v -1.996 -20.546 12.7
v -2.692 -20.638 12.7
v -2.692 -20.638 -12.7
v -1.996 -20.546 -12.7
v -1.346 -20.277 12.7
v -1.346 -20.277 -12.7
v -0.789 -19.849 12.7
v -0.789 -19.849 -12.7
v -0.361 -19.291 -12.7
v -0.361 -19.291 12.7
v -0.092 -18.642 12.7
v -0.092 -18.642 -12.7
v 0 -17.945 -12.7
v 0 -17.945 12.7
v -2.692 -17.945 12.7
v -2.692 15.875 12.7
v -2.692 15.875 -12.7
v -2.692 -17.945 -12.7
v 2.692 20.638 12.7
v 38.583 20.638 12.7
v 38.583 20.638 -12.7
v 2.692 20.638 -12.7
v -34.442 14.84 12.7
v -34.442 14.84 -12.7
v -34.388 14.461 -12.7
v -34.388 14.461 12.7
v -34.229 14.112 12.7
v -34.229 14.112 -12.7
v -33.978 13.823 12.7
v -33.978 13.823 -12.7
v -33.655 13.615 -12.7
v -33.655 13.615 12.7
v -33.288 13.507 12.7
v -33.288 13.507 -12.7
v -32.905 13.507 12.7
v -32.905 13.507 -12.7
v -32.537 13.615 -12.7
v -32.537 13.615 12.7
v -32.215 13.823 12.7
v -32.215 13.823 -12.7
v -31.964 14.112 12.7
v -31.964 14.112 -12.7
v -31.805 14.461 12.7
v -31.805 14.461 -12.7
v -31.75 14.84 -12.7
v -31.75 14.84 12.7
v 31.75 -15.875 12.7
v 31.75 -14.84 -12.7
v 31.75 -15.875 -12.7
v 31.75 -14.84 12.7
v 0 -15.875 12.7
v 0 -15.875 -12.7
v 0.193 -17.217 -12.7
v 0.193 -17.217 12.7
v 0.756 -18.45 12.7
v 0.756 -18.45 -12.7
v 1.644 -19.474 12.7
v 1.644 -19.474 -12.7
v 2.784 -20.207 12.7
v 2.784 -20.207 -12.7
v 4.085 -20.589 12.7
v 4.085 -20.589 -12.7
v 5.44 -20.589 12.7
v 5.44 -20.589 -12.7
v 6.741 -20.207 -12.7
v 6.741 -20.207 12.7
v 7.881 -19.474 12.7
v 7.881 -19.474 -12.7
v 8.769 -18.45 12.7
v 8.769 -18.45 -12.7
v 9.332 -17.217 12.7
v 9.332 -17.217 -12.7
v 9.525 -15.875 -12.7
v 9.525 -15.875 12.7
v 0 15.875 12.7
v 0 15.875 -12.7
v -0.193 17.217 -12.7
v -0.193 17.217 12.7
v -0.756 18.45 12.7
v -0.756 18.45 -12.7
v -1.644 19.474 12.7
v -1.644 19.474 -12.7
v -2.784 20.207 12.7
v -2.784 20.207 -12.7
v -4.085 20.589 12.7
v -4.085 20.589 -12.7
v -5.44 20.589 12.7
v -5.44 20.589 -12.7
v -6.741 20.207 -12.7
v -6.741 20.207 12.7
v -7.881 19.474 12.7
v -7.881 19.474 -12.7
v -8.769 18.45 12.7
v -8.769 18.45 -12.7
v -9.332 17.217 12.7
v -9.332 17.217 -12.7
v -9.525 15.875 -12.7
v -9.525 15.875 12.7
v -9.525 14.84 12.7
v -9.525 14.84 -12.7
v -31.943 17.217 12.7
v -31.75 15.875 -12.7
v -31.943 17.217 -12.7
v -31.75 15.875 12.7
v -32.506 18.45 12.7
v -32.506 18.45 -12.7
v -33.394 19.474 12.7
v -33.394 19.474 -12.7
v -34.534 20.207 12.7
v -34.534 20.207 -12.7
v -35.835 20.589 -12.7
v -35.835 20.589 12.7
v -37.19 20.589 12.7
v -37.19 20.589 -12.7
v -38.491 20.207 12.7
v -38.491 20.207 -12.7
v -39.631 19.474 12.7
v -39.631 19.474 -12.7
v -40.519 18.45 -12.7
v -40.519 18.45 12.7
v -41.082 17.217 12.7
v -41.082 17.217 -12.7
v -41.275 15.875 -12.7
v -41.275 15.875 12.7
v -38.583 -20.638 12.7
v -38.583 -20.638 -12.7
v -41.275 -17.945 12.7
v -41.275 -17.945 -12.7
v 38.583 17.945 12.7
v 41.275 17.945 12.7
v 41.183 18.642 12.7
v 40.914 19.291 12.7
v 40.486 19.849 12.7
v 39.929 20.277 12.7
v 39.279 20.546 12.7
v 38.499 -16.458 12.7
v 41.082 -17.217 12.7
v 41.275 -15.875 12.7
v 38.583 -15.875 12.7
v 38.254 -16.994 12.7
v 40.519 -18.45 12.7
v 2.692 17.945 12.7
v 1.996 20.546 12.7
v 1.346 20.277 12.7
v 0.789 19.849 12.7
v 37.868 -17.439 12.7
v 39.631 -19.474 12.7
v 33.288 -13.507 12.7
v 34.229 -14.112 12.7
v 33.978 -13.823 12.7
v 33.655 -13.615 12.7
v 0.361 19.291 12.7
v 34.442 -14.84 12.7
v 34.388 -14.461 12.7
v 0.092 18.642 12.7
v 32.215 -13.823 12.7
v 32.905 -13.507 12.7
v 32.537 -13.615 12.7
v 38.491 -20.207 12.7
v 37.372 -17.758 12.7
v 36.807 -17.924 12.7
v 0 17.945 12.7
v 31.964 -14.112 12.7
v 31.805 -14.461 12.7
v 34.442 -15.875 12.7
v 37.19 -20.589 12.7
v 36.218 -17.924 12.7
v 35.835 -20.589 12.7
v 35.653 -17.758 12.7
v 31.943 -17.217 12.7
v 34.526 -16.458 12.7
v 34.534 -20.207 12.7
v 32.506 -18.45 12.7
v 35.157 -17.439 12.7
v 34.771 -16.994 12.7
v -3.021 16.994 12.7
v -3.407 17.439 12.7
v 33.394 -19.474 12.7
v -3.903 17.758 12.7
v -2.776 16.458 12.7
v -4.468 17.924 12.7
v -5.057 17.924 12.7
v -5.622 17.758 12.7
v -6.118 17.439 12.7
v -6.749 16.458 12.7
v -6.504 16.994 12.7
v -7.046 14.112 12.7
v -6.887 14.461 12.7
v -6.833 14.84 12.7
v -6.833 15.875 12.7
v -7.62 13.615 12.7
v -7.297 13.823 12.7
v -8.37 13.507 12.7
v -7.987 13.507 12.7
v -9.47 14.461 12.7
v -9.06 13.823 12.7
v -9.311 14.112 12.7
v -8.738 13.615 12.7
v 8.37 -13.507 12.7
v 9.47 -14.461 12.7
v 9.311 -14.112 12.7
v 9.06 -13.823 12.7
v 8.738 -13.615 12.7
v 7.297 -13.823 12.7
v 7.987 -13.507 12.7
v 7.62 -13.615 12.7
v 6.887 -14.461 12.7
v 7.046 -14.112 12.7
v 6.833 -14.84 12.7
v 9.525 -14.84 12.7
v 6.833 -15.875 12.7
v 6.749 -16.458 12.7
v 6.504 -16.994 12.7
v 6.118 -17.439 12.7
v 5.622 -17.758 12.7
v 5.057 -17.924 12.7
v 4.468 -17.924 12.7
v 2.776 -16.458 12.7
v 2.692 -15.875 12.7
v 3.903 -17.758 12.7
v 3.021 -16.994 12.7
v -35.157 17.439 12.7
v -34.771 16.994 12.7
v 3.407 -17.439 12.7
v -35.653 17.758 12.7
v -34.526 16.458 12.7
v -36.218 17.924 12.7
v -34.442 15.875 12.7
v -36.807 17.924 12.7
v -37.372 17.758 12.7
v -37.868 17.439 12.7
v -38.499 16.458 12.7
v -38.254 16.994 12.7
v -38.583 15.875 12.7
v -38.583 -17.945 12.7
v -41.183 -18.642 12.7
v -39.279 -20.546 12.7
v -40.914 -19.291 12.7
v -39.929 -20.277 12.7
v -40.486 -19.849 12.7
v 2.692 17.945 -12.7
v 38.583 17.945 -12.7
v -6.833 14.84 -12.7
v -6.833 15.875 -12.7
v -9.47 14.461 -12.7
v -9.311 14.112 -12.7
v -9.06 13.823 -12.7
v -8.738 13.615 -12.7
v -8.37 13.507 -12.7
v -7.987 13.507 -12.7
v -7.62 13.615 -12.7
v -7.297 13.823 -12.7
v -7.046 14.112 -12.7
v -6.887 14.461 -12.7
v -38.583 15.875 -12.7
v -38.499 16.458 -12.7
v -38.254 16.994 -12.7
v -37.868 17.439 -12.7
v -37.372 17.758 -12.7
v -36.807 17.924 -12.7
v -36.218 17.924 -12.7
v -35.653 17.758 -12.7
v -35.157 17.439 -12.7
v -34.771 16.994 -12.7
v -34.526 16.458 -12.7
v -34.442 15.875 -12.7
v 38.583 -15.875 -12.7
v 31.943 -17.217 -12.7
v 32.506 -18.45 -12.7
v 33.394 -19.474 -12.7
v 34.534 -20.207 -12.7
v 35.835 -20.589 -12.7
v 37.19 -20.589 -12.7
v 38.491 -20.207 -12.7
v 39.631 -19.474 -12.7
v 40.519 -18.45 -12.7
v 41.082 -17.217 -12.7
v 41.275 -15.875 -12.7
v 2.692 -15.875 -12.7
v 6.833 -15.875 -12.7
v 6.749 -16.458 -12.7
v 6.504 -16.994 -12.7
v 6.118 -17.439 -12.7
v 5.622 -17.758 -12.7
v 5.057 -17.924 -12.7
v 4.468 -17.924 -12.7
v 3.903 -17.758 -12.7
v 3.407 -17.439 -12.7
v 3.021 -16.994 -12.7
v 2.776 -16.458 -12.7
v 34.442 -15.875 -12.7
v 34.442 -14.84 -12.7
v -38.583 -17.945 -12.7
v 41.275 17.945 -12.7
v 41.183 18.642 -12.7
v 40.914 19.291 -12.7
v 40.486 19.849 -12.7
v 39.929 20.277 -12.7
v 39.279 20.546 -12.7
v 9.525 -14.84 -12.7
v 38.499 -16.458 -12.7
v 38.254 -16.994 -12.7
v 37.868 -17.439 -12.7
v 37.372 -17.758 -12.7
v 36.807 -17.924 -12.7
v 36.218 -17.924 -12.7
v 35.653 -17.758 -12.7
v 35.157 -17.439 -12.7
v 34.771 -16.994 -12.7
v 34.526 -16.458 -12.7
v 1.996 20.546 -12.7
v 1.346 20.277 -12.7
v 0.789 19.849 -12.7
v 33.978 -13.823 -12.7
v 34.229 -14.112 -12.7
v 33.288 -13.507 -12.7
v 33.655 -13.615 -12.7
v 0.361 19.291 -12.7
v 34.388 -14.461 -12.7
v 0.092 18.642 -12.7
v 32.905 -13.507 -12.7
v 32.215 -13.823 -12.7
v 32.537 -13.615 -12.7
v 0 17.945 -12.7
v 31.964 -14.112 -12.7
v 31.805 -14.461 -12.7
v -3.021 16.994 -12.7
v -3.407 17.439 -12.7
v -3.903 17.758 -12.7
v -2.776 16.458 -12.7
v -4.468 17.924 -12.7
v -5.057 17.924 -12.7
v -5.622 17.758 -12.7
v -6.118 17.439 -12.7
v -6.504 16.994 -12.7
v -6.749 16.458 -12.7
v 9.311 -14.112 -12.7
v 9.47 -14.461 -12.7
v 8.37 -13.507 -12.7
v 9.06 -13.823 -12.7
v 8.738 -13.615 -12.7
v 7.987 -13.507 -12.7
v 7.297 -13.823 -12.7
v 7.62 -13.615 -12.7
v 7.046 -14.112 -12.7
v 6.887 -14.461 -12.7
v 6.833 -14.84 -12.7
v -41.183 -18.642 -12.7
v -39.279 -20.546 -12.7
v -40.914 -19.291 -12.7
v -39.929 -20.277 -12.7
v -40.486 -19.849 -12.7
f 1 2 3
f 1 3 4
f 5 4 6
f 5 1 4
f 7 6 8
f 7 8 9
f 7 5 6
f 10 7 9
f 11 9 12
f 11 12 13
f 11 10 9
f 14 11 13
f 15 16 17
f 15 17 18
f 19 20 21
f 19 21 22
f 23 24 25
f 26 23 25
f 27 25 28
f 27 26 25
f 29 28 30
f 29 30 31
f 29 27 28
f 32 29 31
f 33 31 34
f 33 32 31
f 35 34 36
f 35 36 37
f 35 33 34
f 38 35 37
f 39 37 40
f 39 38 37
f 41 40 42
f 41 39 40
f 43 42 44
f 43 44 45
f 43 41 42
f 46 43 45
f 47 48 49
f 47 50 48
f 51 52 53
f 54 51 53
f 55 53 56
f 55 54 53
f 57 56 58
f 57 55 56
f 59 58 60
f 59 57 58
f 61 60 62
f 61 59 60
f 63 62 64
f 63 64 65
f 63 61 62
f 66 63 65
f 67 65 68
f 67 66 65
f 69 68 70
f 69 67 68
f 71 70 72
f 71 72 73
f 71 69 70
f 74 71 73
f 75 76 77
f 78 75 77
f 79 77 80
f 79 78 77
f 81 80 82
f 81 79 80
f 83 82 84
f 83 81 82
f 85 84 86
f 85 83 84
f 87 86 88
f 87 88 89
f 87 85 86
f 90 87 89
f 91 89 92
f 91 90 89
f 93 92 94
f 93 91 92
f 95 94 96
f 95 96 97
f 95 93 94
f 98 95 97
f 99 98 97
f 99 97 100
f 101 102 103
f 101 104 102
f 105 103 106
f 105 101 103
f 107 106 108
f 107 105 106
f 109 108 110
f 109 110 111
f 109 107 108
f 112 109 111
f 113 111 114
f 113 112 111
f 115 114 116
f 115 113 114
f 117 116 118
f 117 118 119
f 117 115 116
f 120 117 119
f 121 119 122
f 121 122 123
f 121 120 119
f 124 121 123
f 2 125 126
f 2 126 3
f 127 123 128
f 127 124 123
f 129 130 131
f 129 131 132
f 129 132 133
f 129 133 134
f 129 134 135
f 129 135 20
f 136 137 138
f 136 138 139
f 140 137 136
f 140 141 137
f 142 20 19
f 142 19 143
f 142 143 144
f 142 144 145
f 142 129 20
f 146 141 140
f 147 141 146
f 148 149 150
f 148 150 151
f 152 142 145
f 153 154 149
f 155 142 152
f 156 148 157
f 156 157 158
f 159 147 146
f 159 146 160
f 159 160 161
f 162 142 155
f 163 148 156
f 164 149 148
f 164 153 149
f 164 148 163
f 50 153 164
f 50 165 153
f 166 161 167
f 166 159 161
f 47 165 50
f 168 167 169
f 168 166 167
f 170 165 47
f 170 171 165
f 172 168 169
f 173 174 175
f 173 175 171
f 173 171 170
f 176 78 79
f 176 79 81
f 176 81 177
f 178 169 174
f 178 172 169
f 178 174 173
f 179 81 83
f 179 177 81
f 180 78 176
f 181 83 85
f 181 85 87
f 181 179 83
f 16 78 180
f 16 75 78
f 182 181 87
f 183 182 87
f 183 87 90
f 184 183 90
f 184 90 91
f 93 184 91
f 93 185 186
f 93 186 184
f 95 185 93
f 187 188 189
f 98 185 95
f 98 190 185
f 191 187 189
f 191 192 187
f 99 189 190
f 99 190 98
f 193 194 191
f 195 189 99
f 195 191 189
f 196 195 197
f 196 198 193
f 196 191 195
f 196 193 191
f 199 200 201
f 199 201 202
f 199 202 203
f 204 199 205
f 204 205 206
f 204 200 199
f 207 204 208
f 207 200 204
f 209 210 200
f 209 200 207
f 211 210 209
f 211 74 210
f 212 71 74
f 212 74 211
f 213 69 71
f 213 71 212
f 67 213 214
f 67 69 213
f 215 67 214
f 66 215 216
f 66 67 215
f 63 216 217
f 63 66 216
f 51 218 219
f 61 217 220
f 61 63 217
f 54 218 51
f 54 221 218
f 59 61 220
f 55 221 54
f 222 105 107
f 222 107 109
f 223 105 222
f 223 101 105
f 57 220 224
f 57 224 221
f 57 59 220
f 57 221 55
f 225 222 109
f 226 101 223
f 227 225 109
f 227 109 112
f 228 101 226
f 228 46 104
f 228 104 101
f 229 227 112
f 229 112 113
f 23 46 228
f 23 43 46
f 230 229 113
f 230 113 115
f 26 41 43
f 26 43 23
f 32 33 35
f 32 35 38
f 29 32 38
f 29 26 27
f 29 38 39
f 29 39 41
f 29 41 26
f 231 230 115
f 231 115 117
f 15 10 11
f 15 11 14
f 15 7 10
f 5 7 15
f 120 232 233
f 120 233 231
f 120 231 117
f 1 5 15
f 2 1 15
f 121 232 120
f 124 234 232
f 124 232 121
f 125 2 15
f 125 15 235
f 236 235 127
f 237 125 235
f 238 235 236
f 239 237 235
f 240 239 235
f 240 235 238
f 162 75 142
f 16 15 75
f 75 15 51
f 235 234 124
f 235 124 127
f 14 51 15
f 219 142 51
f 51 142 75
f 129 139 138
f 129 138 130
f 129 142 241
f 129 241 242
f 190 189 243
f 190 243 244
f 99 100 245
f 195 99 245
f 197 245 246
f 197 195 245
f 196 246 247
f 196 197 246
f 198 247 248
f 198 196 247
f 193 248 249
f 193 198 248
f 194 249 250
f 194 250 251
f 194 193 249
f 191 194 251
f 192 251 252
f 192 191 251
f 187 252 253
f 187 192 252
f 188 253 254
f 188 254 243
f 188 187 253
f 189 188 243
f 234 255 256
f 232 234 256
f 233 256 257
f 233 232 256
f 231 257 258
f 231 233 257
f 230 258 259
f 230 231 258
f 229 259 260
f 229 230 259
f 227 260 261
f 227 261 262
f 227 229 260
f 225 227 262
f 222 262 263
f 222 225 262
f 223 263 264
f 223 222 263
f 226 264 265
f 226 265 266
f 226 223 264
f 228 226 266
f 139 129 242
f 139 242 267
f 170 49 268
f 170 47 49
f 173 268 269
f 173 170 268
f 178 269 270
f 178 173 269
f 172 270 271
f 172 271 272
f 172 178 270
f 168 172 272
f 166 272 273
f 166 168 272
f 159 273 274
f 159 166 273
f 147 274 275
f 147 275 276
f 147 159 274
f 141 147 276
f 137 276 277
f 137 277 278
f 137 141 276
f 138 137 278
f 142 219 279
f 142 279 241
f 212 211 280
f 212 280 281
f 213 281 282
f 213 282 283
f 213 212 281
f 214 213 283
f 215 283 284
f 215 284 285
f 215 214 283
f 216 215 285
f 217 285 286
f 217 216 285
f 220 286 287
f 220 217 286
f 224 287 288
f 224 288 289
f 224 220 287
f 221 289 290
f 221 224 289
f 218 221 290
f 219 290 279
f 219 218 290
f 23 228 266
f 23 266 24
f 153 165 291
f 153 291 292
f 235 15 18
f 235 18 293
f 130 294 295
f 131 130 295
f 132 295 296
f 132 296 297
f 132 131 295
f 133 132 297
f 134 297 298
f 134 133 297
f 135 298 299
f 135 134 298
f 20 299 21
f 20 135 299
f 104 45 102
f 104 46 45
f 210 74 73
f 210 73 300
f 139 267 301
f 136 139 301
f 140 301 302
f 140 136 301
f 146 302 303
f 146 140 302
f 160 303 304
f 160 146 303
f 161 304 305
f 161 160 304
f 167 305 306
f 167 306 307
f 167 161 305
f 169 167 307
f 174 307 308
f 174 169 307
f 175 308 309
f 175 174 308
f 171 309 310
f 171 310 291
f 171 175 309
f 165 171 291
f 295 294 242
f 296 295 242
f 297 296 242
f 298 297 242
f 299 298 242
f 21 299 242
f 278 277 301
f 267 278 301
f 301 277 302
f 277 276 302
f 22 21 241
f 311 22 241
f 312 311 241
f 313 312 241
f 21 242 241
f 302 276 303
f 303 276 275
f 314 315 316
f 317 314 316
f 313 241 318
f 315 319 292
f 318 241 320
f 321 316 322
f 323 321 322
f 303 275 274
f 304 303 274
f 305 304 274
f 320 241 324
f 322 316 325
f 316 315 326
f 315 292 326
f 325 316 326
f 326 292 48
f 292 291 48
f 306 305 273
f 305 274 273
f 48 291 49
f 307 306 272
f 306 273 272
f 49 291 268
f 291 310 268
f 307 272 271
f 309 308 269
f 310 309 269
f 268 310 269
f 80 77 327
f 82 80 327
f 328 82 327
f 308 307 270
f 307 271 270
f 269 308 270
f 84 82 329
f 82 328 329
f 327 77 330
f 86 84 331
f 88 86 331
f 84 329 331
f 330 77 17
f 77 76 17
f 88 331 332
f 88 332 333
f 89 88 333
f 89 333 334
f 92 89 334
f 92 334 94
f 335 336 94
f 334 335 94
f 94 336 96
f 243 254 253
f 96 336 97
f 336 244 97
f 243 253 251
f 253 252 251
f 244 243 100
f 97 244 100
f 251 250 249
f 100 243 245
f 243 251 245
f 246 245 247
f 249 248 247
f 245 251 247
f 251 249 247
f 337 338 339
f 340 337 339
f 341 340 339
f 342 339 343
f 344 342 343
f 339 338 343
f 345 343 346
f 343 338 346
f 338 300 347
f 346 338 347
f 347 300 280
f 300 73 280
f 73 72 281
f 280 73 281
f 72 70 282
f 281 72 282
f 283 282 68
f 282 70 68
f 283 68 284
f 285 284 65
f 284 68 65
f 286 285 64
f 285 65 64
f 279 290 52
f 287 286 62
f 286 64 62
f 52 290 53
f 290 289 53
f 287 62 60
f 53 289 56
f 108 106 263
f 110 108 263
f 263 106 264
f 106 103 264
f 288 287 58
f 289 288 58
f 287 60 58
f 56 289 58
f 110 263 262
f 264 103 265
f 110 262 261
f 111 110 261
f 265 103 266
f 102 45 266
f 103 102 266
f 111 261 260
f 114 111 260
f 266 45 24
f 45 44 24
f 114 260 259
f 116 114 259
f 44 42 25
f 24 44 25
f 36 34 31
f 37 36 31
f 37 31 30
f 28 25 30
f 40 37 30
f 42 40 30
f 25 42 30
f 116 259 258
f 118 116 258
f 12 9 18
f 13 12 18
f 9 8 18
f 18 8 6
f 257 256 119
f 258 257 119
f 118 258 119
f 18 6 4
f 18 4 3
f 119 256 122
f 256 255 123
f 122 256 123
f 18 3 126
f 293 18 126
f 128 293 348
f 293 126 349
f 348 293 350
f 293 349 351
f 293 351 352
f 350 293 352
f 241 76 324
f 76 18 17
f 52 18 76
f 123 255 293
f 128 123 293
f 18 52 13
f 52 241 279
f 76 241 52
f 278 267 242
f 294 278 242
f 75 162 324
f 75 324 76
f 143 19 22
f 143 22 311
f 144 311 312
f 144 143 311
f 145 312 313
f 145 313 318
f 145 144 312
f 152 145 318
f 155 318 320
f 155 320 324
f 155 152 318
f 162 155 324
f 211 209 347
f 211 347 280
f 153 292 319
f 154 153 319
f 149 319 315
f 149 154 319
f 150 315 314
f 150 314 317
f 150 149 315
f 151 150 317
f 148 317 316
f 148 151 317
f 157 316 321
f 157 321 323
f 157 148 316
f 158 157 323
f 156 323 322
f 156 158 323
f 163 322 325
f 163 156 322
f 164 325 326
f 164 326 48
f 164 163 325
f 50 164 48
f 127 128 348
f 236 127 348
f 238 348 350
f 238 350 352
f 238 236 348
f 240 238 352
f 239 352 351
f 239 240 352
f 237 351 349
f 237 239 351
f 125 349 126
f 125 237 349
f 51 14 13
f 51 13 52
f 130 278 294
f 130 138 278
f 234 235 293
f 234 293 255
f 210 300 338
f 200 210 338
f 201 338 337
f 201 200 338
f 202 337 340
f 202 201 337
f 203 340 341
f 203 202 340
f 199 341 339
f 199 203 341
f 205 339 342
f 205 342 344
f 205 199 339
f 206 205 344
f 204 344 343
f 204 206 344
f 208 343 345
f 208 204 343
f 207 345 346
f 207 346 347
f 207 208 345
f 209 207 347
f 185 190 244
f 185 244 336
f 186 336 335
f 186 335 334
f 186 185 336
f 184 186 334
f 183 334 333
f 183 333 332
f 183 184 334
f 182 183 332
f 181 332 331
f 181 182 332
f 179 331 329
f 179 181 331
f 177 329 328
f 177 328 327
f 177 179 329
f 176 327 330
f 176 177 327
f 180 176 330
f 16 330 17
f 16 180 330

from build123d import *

# Parameters (mm, degrees)
BASE_EXTRUDE_DEPTH = 12.7
CIRPATTERN1_COUNT  = 2


with BuildPart() as part:
    # Sketch1 → Base-Extrude (new, symmetric)
    with BuildSketch(Plane.XY):
        with BuildLine():
            Line((-41.275, 15.875), (-41.275, -17.9451))
            ThreePointArc((-41.275, -17.9451), (-40.486414298, -19.848914298), (-38.5826, -20.6375))
            Line((-38.5826, -20.6375), (-2.6924, -20.6375))
            ThreePointArc((-2.6924, -20.6375), (-0.788585702, -19.848914298), (0, -17.9451))
            Line((0, -17.9451), (0, 15.875))
            ThreePointArc((0, 15.875), (-4.7625, 20.6375), (-9.525, 15.875))
            Line((-9.525, 15.875), (-9.525, 14.83995))
            ThreePointArc((-9.525, 14.83995), (-8.1788, 13.49375), (-6.8326, 14.83995))
            Line((-6.8326, 14.83995), (-6.8326, 15.875))
            ThreePointArc((-6.8326, 15.875), (-4.7625, 17.9451), (-2.6924, 15.875))
            Line((-2.6924, 15.875), (-2.6924, -17.9451))
            Line((-2.6924, -17.9451), (-38.5826, -17.9451))
            Line((-38.5826, -17.9451), (-38.5826, 15.875))
            ThreePointArc((-38.5826, 15.875), (-36.5125, 17.9451), (-34.4424, 15.875))
            Line((-34.4424, 15.875), (-34.4424, 14.83995))
            ThreePointArc((-34.4424, 14.83995), (-33.0962, 13.49375), (-31.75, 14.83995))
            Line((-31.75, 14.83995), (-31.75, 15.875))
            ThreePointArc((-31.75, 15.875), (-36.5125, 20.6375), (-41.275, 15.875))
        make_face()
    base_extrude = extrude(amount=BASE_EXTRUDE_DEPTH, both=True)

    # CirPattern1: Base-Extrude ×2 about axis
    cirpattern1_axis = Axis((0, 0, 0), (0, 0, 1))
    for i in range(1, CIRPATTERN1_COUNT):
        add(base_extrude.rotate(cirpattern1_axis, i * 360 / CIRPATTERN1_COUNT))


solid = part.part
